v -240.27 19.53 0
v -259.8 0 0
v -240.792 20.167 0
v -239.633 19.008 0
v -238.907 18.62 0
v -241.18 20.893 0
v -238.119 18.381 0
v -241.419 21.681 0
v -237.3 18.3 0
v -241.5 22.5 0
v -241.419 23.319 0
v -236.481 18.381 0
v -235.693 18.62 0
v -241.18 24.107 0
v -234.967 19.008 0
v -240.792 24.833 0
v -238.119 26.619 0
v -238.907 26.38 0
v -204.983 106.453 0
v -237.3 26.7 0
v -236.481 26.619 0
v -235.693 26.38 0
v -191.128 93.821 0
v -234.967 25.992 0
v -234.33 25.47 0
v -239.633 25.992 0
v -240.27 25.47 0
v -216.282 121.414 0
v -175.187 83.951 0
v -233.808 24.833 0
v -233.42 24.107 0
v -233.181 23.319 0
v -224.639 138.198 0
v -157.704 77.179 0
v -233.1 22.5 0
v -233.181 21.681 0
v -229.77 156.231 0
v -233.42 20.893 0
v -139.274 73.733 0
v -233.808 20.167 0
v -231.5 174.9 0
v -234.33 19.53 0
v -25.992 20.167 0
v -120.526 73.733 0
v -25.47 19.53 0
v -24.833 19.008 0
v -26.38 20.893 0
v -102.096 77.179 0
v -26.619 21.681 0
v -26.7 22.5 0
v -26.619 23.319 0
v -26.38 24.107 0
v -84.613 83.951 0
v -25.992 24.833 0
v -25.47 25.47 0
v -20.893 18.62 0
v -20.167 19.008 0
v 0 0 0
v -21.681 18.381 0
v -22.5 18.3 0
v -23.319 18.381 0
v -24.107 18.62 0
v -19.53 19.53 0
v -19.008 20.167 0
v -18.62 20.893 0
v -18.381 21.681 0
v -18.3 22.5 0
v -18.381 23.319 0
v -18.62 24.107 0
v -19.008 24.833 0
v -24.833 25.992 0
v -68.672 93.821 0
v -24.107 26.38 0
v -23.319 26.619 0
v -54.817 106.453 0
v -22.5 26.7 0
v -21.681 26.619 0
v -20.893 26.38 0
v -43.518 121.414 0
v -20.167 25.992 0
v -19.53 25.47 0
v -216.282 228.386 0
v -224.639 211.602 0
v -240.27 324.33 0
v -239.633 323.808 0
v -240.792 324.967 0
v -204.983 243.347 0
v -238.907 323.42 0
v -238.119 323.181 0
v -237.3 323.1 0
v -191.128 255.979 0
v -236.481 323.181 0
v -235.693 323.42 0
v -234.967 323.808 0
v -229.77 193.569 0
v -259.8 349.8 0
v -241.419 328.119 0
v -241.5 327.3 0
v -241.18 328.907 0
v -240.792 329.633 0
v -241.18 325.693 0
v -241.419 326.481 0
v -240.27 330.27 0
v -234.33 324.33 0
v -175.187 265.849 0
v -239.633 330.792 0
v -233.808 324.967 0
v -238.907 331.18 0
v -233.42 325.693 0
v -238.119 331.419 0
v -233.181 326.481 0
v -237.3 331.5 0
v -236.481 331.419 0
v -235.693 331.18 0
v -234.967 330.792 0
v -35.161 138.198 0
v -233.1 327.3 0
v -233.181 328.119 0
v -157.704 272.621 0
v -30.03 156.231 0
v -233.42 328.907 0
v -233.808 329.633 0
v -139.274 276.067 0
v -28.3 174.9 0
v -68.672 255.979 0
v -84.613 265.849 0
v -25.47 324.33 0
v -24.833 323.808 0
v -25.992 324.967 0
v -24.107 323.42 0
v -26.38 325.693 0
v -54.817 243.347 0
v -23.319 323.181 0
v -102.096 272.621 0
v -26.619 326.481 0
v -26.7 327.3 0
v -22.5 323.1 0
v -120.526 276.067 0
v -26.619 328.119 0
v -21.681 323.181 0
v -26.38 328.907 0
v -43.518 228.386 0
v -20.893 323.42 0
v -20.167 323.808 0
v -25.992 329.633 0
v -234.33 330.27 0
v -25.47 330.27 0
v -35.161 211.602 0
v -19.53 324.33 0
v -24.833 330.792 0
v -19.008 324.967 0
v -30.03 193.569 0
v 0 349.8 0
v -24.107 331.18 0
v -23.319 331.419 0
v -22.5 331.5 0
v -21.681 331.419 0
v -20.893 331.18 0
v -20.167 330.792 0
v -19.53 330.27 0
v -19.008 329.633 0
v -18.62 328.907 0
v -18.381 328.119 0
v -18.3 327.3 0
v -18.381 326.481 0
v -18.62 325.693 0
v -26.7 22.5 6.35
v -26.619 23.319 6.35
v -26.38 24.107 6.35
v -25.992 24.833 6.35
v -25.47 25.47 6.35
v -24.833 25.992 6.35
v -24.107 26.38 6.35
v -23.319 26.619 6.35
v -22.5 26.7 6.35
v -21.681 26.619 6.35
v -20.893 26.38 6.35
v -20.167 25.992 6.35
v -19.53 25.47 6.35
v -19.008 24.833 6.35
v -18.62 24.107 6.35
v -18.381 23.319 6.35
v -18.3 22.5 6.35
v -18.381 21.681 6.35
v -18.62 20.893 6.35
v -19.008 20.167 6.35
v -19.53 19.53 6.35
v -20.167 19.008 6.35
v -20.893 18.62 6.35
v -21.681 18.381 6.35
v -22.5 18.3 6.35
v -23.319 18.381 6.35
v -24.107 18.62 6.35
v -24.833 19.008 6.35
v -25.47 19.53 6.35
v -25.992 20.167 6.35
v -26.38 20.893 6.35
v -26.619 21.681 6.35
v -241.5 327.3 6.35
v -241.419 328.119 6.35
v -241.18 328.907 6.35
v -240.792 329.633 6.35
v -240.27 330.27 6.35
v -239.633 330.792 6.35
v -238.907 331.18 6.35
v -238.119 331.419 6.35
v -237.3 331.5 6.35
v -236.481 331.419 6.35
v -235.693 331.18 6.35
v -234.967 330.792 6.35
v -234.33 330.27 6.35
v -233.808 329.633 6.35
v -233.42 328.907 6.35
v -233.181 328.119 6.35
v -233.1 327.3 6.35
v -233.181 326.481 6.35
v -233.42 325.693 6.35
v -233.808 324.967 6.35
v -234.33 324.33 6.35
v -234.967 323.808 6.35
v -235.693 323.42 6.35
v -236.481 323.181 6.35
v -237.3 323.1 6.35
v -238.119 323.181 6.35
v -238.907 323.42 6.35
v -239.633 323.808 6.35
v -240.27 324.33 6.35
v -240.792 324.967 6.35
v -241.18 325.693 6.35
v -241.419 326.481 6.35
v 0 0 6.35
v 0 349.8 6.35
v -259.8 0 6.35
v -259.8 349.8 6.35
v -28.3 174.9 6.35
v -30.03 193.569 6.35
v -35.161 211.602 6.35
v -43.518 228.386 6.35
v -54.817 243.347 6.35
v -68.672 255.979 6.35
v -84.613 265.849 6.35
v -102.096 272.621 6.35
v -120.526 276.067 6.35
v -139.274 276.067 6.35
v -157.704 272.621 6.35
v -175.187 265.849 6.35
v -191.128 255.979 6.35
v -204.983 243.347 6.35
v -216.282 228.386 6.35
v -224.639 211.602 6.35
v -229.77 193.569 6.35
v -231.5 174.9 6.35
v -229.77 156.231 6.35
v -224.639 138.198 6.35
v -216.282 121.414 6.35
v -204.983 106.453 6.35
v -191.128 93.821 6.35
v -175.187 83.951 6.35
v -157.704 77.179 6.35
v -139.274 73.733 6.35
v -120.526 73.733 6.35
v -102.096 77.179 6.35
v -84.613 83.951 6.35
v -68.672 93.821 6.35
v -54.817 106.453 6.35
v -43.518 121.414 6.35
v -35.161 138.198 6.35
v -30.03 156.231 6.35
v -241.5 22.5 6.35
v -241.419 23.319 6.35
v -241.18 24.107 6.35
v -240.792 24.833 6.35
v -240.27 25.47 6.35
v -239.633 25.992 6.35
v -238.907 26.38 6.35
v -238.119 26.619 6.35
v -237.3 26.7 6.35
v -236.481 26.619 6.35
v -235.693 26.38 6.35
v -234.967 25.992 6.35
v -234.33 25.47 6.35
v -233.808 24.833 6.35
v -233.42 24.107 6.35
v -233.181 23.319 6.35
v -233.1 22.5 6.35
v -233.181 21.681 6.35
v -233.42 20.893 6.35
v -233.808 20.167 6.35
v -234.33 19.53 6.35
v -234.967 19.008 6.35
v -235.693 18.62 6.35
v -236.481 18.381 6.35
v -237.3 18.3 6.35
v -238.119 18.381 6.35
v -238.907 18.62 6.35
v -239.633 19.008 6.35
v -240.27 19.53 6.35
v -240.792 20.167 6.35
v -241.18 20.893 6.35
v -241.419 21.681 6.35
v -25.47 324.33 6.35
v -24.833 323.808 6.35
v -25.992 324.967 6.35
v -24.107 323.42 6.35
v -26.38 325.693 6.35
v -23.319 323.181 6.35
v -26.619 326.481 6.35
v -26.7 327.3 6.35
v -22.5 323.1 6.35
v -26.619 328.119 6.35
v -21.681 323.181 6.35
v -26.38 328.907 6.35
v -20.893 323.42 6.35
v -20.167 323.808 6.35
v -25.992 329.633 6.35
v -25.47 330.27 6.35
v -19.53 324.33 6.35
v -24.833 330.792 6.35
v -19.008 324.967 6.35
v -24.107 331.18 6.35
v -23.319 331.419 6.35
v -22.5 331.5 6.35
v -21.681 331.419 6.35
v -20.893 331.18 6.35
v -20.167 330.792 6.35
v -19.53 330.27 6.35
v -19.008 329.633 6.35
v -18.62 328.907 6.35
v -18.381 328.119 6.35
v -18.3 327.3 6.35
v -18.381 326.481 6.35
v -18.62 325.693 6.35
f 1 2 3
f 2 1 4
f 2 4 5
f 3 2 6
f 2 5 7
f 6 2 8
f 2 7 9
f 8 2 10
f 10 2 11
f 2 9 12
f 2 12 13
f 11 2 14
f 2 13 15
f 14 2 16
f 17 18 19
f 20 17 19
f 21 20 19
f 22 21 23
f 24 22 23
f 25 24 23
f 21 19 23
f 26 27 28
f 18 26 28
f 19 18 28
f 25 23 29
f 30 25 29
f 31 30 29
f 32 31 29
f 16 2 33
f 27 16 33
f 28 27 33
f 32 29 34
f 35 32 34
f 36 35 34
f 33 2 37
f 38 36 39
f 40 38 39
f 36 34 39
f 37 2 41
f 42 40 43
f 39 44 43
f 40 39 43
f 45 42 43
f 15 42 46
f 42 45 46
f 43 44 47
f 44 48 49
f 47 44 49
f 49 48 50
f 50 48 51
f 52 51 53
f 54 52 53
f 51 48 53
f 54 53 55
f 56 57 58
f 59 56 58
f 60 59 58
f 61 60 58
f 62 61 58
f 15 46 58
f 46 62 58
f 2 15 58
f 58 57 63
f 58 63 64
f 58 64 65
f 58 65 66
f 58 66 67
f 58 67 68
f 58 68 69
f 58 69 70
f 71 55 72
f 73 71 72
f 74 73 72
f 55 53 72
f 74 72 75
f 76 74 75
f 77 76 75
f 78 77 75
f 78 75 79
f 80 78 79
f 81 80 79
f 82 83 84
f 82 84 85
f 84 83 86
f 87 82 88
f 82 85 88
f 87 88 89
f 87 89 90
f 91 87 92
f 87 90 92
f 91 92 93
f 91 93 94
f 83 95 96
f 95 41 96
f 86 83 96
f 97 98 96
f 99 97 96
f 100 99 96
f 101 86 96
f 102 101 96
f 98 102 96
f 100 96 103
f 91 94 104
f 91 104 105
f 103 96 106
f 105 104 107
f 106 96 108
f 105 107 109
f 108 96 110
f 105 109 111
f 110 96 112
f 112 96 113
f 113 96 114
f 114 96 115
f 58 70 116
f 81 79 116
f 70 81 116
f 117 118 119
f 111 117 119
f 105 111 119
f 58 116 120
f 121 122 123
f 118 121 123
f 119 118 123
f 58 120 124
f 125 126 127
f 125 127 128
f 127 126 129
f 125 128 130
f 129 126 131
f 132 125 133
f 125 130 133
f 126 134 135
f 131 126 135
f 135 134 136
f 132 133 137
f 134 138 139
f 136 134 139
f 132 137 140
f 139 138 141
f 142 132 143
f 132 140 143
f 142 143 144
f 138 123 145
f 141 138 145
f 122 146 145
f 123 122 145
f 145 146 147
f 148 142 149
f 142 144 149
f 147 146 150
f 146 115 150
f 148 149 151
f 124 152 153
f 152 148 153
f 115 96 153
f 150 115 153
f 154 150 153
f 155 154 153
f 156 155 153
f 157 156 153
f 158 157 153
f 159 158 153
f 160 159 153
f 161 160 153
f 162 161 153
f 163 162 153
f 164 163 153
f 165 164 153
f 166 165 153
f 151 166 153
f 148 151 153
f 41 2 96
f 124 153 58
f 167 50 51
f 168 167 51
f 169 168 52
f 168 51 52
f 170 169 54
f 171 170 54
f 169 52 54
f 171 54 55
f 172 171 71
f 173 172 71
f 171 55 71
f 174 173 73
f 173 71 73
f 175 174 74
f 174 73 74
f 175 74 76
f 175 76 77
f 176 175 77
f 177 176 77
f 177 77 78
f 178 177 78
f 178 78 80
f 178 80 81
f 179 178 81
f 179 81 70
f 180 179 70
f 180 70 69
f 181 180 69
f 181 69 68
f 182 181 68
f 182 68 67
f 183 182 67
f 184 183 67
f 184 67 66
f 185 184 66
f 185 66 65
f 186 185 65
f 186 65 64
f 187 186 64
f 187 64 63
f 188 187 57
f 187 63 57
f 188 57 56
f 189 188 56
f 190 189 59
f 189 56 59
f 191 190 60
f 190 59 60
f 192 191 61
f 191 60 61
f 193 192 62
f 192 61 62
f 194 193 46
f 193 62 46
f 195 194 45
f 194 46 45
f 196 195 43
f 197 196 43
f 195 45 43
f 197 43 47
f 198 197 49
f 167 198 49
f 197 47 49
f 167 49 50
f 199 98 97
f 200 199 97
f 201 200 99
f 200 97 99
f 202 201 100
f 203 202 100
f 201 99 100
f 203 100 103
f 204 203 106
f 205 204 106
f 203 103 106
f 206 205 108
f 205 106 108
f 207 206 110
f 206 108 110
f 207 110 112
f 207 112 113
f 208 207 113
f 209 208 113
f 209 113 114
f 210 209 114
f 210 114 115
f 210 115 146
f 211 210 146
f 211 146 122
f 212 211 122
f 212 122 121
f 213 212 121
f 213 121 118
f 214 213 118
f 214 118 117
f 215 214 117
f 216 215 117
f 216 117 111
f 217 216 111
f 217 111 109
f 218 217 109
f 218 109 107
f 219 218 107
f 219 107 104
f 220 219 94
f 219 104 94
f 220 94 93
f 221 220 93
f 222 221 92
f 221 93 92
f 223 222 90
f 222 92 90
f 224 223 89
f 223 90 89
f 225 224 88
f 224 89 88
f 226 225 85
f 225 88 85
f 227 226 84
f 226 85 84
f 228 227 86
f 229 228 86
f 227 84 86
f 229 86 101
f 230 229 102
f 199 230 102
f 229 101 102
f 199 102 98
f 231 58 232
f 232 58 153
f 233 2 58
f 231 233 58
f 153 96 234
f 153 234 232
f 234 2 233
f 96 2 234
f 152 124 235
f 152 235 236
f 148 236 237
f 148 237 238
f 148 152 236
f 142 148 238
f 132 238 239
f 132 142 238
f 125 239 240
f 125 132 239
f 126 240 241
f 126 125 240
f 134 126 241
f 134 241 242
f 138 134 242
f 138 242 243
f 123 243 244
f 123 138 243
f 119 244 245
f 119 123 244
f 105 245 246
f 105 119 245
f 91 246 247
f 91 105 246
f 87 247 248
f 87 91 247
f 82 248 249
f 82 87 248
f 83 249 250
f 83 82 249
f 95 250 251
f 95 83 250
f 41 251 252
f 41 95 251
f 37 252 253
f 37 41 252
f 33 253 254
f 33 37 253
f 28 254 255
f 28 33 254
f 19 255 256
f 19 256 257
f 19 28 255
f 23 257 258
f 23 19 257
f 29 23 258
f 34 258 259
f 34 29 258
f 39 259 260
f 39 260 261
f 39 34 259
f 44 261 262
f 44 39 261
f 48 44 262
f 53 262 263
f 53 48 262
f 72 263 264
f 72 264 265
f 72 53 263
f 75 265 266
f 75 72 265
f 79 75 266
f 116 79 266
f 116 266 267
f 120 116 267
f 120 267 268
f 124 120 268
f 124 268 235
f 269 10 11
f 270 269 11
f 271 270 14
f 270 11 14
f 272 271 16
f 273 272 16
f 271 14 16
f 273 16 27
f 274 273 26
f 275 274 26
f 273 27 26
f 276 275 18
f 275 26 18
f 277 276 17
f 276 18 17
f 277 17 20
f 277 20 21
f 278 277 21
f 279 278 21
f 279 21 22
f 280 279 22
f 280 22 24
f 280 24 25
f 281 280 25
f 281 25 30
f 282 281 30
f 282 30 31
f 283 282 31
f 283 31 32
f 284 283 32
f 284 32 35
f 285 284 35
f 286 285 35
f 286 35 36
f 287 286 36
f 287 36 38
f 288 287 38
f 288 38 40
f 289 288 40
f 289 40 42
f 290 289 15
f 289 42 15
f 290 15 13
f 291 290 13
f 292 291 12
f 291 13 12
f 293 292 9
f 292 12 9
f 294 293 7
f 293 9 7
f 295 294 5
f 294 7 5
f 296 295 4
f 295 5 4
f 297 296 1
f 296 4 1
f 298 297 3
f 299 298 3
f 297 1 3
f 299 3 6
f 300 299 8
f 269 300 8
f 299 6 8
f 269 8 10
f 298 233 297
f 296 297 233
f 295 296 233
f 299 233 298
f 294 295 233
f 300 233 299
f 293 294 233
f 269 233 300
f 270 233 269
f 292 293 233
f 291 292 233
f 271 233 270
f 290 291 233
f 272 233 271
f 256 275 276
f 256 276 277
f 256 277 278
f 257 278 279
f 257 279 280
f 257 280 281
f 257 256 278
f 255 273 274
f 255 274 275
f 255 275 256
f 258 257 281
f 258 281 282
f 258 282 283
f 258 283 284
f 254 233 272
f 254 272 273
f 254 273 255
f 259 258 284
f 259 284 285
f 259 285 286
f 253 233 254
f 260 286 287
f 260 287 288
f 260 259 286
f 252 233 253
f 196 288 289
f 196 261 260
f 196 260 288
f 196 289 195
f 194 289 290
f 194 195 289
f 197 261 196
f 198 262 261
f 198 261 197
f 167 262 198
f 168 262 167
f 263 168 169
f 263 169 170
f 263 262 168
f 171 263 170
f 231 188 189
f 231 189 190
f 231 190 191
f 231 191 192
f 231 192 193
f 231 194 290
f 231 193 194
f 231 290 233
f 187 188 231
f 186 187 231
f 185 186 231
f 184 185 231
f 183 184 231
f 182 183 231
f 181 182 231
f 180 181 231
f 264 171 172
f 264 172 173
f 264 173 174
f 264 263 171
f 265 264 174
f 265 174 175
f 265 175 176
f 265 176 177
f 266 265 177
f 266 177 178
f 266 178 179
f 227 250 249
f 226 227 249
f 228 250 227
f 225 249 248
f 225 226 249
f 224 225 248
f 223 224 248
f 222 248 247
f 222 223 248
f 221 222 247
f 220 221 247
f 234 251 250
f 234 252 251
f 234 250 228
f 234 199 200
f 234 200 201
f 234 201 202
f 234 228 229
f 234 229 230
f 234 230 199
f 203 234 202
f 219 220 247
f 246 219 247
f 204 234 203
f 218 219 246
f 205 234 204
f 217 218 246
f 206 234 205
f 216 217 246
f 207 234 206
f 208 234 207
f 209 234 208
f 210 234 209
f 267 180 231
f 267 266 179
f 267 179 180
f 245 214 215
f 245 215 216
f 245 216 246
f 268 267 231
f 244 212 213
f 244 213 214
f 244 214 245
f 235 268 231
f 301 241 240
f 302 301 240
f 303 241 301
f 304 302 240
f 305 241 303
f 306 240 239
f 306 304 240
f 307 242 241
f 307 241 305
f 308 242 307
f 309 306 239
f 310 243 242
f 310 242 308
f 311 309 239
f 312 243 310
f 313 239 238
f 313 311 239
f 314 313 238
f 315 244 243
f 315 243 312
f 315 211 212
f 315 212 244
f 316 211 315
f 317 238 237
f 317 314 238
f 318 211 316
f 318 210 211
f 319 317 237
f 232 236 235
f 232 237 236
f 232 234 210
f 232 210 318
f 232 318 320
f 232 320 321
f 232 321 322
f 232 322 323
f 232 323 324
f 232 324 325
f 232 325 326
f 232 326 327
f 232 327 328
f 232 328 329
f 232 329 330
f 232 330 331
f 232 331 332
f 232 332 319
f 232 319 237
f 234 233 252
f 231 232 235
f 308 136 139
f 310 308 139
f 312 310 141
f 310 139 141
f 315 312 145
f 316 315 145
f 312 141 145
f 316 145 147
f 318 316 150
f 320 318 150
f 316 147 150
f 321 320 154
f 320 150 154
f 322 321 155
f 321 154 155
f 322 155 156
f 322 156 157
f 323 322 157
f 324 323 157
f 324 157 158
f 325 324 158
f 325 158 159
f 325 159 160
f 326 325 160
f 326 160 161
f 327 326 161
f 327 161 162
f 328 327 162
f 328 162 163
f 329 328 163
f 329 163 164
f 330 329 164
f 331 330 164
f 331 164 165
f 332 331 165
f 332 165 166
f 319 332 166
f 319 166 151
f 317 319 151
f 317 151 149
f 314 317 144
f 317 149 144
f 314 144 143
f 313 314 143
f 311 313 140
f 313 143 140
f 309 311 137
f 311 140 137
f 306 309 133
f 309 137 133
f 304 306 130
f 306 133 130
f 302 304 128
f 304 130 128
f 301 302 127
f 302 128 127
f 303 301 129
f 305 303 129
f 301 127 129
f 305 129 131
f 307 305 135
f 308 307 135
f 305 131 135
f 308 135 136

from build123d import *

# Parameters (mm, degrees)
SKETCH1_W                = 259.8
SKETCH1_H                = 349.8
SKETCH1_R                = 101.6
BOSS_EXTRUDE1_DEPTH      = 6.35
M8_CLEARANCE_HOLE1_D     = 8.4
M8_CLEARANCE_HOLE1_DEPTH = 76.2
M8_CLEARANCE_HOLE1_TIP   = 2.5236146


with BuildPart() as part:
    # Sketch1 → Boss-Extrude1 (new body)
    with BuildSketch(Plane.XY):
        with Locations((-129.9, 174.9)):
            Rectangle(SKETCH1_W, SKETCH1_H)
        with Locations((-129.9, 174.9)):
            Circle(SKETCH1_R, mode=Mode.SUBTRACT)
    extrude(amount=BOSS_EXTRUDE1_DEPTH)

    # M8 Clearance Hole1
    with Locations(Plane.XY.offset(6.35)):
        with Locations((-237.3, 327.3), (-22.5, 327.3), (-22.5, 22.5), (-237.3, 22.5)):
            Hole(M8_CLEARANCE_HOLE1_D / 2, depth=M8_CLEARANCE_HOLE1_DEPTH)
            with Locations((0, 0, -(M8_CLEARANCE_HOLE1_DEPTH + M8_CLEARANCE_HOLE1_TIP / 2))):  # 118° drill point
                Cone(0, M8_CLEARANCE_HOLE1_D / 2, M8_CLEARANCE_HOLE1_TIP, mode=Mode.SUBTRACT)


solid = part.part
